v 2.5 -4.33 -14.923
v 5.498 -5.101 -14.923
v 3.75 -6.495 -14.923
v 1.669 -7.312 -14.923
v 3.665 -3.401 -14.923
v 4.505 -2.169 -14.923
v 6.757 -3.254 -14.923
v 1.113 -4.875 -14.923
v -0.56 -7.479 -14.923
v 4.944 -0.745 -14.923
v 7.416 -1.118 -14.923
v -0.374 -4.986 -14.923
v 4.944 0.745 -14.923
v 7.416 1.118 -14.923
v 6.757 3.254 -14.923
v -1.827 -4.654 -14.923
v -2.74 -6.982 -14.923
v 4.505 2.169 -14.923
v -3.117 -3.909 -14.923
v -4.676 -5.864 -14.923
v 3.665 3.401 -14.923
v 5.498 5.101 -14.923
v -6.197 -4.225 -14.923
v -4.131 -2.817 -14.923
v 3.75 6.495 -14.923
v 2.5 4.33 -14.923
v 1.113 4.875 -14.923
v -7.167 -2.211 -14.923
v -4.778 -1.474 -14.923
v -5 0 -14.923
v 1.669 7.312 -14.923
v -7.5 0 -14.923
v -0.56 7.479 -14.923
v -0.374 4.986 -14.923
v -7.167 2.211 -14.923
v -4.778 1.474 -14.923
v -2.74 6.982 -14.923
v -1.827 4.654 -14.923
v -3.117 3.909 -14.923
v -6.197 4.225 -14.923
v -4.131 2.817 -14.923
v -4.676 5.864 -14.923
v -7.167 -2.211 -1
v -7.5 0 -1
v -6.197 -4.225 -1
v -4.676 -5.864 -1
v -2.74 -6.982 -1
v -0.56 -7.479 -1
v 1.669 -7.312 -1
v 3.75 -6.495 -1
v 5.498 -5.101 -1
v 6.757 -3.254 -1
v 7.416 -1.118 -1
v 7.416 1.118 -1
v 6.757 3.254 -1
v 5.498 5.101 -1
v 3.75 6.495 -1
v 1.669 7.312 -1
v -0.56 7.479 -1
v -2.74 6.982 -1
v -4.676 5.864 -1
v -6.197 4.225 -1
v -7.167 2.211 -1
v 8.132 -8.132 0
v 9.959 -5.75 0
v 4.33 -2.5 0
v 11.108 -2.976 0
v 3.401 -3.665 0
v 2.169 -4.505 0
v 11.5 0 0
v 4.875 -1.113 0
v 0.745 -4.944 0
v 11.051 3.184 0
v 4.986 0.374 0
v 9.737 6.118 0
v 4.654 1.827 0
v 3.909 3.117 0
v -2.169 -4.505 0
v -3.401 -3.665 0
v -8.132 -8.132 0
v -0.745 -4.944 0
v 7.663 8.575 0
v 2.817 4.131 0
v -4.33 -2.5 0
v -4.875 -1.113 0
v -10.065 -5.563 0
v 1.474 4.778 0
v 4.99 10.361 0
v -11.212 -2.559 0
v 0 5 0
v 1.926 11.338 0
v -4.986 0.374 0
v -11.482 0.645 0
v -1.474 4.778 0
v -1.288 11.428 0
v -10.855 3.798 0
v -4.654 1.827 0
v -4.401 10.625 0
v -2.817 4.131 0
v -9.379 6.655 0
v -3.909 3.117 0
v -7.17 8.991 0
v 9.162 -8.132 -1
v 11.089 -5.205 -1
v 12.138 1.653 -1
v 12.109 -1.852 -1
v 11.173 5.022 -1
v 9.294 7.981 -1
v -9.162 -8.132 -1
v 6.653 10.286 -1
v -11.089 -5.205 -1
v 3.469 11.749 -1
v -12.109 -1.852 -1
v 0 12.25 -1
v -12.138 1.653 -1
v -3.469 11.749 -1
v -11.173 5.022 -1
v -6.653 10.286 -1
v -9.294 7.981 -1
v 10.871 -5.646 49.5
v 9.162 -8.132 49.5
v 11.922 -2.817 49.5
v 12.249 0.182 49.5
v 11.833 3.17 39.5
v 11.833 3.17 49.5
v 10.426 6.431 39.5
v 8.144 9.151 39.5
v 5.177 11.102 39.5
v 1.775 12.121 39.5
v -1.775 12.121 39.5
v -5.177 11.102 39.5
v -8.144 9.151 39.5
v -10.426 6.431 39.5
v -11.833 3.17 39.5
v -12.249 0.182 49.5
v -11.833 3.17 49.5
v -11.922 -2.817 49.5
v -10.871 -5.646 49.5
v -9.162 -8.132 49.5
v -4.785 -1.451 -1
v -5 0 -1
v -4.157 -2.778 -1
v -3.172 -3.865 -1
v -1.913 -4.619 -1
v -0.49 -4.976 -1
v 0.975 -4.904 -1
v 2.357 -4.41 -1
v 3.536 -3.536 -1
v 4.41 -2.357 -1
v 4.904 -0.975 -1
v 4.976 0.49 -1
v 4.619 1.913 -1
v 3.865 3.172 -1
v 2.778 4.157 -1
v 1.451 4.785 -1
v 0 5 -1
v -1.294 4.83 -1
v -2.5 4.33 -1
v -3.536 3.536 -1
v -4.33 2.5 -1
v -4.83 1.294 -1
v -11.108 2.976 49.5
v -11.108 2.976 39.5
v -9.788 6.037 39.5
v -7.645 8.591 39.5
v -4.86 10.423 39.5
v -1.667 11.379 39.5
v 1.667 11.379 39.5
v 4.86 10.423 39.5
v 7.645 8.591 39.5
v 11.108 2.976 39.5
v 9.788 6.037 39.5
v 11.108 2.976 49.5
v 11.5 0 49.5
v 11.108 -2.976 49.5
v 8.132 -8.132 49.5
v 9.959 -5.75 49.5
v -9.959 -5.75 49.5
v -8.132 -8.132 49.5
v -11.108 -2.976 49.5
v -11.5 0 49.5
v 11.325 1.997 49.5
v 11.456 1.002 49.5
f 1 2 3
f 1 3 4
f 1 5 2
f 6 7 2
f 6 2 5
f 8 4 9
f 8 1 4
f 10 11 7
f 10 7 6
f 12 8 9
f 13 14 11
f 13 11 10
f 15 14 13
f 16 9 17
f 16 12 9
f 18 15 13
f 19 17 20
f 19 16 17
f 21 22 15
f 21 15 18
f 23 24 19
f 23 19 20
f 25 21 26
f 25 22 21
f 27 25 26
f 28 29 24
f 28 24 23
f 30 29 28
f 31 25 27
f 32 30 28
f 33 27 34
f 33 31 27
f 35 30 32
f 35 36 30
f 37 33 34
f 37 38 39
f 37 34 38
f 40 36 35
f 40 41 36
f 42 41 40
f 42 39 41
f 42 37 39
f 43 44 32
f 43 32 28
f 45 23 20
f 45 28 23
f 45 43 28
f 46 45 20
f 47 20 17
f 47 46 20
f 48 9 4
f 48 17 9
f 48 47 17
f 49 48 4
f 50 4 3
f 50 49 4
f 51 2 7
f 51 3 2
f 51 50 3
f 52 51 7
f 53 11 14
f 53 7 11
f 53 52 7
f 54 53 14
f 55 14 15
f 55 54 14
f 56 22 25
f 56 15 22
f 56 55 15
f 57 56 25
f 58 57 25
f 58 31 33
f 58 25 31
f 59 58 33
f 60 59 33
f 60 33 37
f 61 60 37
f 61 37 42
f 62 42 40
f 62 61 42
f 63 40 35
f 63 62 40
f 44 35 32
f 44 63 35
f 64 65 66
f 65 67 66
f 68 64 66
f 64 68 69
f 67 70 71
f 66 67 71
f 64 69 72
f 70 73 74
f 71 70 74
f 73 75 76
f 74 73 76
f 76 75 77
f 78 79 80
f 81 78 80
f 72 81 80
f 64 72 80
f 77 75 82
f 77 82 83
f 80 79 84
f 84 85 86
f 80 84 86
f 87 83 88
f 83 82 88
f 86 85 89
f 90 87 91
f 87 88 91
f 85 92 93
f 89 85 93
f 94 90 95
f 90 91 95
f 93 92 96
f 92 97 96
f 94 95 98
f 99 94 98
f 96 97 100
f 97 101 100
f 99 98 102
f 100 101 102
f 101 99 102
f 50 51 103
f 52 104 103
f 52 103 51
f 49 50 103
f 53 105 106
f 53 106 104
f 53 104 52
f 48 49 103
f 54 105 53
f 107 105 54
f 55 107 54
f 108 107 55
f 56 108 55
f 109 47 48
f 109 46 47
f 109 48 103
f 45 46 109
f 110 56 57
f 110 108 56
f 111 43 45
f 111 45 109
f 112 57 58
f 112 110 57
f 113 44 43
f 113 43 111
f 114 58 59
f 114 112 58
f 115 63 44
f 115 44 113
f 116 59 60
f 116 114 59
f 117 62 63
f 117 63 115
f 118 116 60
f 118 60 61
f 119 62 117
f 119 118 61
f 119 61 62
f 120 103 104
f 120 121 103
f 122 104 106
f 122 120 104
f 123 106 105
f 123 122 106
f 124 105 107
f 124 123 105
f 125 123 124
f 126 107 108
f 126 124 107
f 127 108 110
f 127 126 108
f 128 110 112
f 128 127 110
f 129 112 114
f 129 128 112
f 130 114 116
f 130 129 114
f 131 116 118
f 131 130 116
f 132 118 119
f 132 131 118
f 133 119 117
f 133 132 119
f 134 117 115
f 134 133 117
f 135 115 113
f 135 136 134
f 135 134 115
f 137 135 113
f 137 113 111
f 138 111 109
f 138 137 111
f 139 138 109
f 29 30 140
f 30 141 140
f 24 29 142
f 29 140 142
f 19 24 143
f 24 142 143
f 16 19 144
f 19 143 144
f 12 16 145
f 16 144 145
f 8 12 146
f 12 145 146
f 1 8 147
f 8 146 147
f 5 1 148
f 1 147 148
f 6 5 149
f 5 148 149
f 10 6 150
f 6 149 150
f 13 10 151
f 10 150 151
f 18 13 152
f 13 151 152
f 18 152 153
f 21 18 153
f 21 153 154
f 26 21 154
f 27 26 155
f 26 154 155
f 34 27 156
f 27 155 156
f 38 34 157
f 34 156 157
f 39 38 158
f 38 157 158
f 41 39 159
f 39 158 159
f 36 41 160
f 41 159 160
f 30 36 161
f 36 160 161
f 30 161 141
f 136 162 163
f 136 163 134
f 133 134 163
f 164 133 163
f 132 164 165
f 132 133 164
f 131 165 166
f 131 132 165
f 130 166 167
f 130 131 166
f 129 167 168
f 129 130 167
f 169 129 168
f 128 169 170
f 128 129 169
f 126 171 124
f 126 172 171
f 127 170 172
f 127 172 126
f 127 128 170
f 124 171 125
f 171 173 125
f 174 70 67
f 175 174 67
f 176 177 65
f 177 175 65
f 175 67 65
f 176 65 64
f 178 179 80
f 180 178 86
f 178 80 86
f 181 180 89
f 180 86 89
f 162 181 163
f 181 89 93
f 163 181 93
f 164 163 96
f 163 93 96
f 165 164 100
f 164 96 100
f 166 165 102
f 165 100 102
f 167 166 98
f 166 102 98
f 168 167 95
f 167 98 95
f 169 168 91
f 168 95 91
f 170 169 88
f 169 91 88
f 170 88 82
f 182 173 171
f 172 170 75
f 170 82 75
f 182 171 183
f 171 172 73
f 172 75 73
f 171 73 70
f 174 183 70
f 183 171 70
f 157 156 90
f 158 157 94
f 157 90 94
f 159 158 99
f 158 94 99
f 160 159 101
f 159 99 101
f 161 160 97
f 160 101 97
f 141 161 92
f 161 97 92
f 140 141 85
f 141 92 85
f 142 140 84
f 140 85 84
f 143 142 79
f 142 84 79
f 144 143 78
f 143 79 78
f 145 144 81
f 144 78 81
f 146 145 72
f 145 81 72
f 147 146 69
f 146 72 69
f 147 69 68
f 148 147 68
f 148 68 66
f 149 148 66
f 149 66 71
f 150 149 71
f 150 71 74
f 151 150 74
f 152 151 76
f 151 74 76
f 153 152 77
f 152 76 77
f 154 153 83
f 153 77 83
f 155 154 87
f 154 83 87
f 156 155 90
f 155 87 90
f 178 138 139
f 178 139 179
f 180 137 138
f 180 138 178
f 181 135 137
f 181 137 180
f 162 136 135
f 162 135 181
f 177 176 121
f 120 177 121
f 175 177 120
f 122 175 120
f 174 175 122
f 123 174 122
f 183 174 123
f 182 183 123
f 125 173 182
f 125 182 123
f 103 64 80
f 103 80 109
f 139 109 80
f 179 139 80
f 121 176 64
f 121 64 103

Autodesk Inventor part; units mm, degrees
ref_plane "YZ Plane" through (0, 0, 0) normal (1, 0, 0) x (0, 1, 0)
sketch "Sketch1" plane through (0, 0, 0) normal (0, 0, 1) x (1, 0, 0)
  circle A0 centre (0, 0) radius 12.25
  circle A1 centre (0, 0) radius 11.5
  dimension "d0" = 24.5
  dimension "d1" = 23
extrude "Extrusion1" add sketch "Sketch1" along normal blind 49.5
sketch "Sketch2" plane through (0, 0, 49.5) normal (0, 0, 1) x (1, 0, 0)
  line L0 (-17.15, 0) -> (17.15, 0) projected
  line L1 (0, -17.15) -> (0, 17.15) projected
  line L2 (0, 0) -> (-11.8326, 3.1705)
  line L3 (0, 0) -> (-8.6621, -8.6621)
  line L4 (0, 0) -> (11.8326, 3.1705)
  line L5 (0, 0) -> (8.6621, -8.6621)
  arc A0 (11.8326, 3.1705) -> (-11.8326, 3.1705) centre (0, 0) ccw
  arc A1 (-8.6621, -8.6621) -> (8.6621, -8.6621) centre (0, 0) ccw
  dimension "d4" = 15
  dimension "d5" = 45
extrude "Extrusion2" cut sketch "Sketch2" against normal blind 10
sketch "Sketch3" plane through (0, 0, 0) normal (0, 0, -1) x (-1, 0, 0)
  circle A0 centre (0, 0) radius 12.25 projected
extrude "Extrusion3" add sketch "Sketch3" along normal blind 1
sketch "Sketch4" plane through (0, 0, -1) normal (0, 0, -1) x (-1, 0, 0)
  circle A0 centre (0, 0) radius 12.25 projected
hole "Hole1" at (0, 0, -1) direction (0, 0, 1) diameter 10 end through all
ref_plane "Work Plane1" through (0, -12.25, 0) normal (0, 1, 0) x (-1, 0, 0)
sketch "Sketch5" plane through (0, -12.25, 0) normal (0, 1, 0) x (-1, 0, 0)
  line L0 (12.25, -1) -> (-12.25, -1) projected
  line L1 (11.5, 0) -> (-11.5, 0) projected
  line L2 (-5, 0) -> (-5, -1) projected
  line L3 (5, 0) -> (5, -1) projected
  line L4 (12.25, -1) -> (12.25, 49.5) projected
  line L5 (-12.25, -1) -> (-12.25, 49.5) projected
  line L6 (12.25, -1) -> (-12.25, -1) projected
  line L7 (11.8326, 49.5) -> (11.8326, 39.5) projected
  line L8 (11.8326, 39.5) -> (-11.8326, 39.5) projected
  line L9 (-11.8326, 39.5) -> (-11.8326, 49.5) projected
  line L10 (-11.8326, 49.5) -> (-8.6621, 49.5) projected
  line L11 (-8.6621, 49.5) -> (-8.6621, 39.5) projected
  line L12 (-8.6621, 39.5) -> (8.6621, 39.5) projected
  line L13 (8.6621, 39.5) -> (8.6621, 49.5) projected
  line L14 (8.6621, 49.5) -> (11.8326, 49.5) projected
  line L15 (11.5, 0) -> (11.5, 49.5) projected
  line L16 (0, -13.4846) -> (0, 73.9076) projected
  line L17 (7.5, 49) -> (-7.5, 49)
  line L18 (-7.5, 49) -> (-7.5, -1)
  line L19 (-7.5, -1) -> (7.5, -1)
  line L20 (7.5, -1) -> (7.5, 49)
  point P0 (0, 0)
  point P1 (0, 49)
  point P2 (0, 0)
  dimension "d17" = 15
  dimension "d18" = 50
extrude "Extrusion4" [suppressed]
ref_plane "Work Plane2" through (0, -12.25, 0) normal (0, 1, 0) x (-1, 0, 0)
sketch "Sketch8" plane through (0, 0, -1) normal (0, 0, -1) x (-1, 0, 0)
  circle A0 centre (0, 0) radius 5 projected
  circle A1 centre (0, 0) radius 7.5
  dimension "d26" = 15
extrude "Extrusion7" add sketch "Sketch8" along normal blind 13.923
sketch "Sketch7" plane through (0, 0, 49.5) normal (0, 0, 1) x (1, 0, 0)
  arc A0 (8.6621, -8.6621) -> (11.8326, 3.1705) centre (0, 0) ccw projected
  arc A1 (8.1317, -8.1317) -> (11.1081, 2.9764) centre (0, 0) ccw projected
  line L0 (8.1317, -8.1317) -> (8.6621, -8.6621) projected
  line L1 (-10.4211, -8.1317) -> (11.1081, -8.1317)
  line L2 (11.1081, -8.1317) -> (11.1081, -13.0652)
  line L3 (11.1081, -13.0652) -> (-10.4211, -13.0652)
  line L4 (-10.4211, -13.0652) -> (-10.4211, -8.1317)
extrude "Extrusion6" cut sketch "Sketch7" against normal through all
properties part number "ss_inner_guide"
